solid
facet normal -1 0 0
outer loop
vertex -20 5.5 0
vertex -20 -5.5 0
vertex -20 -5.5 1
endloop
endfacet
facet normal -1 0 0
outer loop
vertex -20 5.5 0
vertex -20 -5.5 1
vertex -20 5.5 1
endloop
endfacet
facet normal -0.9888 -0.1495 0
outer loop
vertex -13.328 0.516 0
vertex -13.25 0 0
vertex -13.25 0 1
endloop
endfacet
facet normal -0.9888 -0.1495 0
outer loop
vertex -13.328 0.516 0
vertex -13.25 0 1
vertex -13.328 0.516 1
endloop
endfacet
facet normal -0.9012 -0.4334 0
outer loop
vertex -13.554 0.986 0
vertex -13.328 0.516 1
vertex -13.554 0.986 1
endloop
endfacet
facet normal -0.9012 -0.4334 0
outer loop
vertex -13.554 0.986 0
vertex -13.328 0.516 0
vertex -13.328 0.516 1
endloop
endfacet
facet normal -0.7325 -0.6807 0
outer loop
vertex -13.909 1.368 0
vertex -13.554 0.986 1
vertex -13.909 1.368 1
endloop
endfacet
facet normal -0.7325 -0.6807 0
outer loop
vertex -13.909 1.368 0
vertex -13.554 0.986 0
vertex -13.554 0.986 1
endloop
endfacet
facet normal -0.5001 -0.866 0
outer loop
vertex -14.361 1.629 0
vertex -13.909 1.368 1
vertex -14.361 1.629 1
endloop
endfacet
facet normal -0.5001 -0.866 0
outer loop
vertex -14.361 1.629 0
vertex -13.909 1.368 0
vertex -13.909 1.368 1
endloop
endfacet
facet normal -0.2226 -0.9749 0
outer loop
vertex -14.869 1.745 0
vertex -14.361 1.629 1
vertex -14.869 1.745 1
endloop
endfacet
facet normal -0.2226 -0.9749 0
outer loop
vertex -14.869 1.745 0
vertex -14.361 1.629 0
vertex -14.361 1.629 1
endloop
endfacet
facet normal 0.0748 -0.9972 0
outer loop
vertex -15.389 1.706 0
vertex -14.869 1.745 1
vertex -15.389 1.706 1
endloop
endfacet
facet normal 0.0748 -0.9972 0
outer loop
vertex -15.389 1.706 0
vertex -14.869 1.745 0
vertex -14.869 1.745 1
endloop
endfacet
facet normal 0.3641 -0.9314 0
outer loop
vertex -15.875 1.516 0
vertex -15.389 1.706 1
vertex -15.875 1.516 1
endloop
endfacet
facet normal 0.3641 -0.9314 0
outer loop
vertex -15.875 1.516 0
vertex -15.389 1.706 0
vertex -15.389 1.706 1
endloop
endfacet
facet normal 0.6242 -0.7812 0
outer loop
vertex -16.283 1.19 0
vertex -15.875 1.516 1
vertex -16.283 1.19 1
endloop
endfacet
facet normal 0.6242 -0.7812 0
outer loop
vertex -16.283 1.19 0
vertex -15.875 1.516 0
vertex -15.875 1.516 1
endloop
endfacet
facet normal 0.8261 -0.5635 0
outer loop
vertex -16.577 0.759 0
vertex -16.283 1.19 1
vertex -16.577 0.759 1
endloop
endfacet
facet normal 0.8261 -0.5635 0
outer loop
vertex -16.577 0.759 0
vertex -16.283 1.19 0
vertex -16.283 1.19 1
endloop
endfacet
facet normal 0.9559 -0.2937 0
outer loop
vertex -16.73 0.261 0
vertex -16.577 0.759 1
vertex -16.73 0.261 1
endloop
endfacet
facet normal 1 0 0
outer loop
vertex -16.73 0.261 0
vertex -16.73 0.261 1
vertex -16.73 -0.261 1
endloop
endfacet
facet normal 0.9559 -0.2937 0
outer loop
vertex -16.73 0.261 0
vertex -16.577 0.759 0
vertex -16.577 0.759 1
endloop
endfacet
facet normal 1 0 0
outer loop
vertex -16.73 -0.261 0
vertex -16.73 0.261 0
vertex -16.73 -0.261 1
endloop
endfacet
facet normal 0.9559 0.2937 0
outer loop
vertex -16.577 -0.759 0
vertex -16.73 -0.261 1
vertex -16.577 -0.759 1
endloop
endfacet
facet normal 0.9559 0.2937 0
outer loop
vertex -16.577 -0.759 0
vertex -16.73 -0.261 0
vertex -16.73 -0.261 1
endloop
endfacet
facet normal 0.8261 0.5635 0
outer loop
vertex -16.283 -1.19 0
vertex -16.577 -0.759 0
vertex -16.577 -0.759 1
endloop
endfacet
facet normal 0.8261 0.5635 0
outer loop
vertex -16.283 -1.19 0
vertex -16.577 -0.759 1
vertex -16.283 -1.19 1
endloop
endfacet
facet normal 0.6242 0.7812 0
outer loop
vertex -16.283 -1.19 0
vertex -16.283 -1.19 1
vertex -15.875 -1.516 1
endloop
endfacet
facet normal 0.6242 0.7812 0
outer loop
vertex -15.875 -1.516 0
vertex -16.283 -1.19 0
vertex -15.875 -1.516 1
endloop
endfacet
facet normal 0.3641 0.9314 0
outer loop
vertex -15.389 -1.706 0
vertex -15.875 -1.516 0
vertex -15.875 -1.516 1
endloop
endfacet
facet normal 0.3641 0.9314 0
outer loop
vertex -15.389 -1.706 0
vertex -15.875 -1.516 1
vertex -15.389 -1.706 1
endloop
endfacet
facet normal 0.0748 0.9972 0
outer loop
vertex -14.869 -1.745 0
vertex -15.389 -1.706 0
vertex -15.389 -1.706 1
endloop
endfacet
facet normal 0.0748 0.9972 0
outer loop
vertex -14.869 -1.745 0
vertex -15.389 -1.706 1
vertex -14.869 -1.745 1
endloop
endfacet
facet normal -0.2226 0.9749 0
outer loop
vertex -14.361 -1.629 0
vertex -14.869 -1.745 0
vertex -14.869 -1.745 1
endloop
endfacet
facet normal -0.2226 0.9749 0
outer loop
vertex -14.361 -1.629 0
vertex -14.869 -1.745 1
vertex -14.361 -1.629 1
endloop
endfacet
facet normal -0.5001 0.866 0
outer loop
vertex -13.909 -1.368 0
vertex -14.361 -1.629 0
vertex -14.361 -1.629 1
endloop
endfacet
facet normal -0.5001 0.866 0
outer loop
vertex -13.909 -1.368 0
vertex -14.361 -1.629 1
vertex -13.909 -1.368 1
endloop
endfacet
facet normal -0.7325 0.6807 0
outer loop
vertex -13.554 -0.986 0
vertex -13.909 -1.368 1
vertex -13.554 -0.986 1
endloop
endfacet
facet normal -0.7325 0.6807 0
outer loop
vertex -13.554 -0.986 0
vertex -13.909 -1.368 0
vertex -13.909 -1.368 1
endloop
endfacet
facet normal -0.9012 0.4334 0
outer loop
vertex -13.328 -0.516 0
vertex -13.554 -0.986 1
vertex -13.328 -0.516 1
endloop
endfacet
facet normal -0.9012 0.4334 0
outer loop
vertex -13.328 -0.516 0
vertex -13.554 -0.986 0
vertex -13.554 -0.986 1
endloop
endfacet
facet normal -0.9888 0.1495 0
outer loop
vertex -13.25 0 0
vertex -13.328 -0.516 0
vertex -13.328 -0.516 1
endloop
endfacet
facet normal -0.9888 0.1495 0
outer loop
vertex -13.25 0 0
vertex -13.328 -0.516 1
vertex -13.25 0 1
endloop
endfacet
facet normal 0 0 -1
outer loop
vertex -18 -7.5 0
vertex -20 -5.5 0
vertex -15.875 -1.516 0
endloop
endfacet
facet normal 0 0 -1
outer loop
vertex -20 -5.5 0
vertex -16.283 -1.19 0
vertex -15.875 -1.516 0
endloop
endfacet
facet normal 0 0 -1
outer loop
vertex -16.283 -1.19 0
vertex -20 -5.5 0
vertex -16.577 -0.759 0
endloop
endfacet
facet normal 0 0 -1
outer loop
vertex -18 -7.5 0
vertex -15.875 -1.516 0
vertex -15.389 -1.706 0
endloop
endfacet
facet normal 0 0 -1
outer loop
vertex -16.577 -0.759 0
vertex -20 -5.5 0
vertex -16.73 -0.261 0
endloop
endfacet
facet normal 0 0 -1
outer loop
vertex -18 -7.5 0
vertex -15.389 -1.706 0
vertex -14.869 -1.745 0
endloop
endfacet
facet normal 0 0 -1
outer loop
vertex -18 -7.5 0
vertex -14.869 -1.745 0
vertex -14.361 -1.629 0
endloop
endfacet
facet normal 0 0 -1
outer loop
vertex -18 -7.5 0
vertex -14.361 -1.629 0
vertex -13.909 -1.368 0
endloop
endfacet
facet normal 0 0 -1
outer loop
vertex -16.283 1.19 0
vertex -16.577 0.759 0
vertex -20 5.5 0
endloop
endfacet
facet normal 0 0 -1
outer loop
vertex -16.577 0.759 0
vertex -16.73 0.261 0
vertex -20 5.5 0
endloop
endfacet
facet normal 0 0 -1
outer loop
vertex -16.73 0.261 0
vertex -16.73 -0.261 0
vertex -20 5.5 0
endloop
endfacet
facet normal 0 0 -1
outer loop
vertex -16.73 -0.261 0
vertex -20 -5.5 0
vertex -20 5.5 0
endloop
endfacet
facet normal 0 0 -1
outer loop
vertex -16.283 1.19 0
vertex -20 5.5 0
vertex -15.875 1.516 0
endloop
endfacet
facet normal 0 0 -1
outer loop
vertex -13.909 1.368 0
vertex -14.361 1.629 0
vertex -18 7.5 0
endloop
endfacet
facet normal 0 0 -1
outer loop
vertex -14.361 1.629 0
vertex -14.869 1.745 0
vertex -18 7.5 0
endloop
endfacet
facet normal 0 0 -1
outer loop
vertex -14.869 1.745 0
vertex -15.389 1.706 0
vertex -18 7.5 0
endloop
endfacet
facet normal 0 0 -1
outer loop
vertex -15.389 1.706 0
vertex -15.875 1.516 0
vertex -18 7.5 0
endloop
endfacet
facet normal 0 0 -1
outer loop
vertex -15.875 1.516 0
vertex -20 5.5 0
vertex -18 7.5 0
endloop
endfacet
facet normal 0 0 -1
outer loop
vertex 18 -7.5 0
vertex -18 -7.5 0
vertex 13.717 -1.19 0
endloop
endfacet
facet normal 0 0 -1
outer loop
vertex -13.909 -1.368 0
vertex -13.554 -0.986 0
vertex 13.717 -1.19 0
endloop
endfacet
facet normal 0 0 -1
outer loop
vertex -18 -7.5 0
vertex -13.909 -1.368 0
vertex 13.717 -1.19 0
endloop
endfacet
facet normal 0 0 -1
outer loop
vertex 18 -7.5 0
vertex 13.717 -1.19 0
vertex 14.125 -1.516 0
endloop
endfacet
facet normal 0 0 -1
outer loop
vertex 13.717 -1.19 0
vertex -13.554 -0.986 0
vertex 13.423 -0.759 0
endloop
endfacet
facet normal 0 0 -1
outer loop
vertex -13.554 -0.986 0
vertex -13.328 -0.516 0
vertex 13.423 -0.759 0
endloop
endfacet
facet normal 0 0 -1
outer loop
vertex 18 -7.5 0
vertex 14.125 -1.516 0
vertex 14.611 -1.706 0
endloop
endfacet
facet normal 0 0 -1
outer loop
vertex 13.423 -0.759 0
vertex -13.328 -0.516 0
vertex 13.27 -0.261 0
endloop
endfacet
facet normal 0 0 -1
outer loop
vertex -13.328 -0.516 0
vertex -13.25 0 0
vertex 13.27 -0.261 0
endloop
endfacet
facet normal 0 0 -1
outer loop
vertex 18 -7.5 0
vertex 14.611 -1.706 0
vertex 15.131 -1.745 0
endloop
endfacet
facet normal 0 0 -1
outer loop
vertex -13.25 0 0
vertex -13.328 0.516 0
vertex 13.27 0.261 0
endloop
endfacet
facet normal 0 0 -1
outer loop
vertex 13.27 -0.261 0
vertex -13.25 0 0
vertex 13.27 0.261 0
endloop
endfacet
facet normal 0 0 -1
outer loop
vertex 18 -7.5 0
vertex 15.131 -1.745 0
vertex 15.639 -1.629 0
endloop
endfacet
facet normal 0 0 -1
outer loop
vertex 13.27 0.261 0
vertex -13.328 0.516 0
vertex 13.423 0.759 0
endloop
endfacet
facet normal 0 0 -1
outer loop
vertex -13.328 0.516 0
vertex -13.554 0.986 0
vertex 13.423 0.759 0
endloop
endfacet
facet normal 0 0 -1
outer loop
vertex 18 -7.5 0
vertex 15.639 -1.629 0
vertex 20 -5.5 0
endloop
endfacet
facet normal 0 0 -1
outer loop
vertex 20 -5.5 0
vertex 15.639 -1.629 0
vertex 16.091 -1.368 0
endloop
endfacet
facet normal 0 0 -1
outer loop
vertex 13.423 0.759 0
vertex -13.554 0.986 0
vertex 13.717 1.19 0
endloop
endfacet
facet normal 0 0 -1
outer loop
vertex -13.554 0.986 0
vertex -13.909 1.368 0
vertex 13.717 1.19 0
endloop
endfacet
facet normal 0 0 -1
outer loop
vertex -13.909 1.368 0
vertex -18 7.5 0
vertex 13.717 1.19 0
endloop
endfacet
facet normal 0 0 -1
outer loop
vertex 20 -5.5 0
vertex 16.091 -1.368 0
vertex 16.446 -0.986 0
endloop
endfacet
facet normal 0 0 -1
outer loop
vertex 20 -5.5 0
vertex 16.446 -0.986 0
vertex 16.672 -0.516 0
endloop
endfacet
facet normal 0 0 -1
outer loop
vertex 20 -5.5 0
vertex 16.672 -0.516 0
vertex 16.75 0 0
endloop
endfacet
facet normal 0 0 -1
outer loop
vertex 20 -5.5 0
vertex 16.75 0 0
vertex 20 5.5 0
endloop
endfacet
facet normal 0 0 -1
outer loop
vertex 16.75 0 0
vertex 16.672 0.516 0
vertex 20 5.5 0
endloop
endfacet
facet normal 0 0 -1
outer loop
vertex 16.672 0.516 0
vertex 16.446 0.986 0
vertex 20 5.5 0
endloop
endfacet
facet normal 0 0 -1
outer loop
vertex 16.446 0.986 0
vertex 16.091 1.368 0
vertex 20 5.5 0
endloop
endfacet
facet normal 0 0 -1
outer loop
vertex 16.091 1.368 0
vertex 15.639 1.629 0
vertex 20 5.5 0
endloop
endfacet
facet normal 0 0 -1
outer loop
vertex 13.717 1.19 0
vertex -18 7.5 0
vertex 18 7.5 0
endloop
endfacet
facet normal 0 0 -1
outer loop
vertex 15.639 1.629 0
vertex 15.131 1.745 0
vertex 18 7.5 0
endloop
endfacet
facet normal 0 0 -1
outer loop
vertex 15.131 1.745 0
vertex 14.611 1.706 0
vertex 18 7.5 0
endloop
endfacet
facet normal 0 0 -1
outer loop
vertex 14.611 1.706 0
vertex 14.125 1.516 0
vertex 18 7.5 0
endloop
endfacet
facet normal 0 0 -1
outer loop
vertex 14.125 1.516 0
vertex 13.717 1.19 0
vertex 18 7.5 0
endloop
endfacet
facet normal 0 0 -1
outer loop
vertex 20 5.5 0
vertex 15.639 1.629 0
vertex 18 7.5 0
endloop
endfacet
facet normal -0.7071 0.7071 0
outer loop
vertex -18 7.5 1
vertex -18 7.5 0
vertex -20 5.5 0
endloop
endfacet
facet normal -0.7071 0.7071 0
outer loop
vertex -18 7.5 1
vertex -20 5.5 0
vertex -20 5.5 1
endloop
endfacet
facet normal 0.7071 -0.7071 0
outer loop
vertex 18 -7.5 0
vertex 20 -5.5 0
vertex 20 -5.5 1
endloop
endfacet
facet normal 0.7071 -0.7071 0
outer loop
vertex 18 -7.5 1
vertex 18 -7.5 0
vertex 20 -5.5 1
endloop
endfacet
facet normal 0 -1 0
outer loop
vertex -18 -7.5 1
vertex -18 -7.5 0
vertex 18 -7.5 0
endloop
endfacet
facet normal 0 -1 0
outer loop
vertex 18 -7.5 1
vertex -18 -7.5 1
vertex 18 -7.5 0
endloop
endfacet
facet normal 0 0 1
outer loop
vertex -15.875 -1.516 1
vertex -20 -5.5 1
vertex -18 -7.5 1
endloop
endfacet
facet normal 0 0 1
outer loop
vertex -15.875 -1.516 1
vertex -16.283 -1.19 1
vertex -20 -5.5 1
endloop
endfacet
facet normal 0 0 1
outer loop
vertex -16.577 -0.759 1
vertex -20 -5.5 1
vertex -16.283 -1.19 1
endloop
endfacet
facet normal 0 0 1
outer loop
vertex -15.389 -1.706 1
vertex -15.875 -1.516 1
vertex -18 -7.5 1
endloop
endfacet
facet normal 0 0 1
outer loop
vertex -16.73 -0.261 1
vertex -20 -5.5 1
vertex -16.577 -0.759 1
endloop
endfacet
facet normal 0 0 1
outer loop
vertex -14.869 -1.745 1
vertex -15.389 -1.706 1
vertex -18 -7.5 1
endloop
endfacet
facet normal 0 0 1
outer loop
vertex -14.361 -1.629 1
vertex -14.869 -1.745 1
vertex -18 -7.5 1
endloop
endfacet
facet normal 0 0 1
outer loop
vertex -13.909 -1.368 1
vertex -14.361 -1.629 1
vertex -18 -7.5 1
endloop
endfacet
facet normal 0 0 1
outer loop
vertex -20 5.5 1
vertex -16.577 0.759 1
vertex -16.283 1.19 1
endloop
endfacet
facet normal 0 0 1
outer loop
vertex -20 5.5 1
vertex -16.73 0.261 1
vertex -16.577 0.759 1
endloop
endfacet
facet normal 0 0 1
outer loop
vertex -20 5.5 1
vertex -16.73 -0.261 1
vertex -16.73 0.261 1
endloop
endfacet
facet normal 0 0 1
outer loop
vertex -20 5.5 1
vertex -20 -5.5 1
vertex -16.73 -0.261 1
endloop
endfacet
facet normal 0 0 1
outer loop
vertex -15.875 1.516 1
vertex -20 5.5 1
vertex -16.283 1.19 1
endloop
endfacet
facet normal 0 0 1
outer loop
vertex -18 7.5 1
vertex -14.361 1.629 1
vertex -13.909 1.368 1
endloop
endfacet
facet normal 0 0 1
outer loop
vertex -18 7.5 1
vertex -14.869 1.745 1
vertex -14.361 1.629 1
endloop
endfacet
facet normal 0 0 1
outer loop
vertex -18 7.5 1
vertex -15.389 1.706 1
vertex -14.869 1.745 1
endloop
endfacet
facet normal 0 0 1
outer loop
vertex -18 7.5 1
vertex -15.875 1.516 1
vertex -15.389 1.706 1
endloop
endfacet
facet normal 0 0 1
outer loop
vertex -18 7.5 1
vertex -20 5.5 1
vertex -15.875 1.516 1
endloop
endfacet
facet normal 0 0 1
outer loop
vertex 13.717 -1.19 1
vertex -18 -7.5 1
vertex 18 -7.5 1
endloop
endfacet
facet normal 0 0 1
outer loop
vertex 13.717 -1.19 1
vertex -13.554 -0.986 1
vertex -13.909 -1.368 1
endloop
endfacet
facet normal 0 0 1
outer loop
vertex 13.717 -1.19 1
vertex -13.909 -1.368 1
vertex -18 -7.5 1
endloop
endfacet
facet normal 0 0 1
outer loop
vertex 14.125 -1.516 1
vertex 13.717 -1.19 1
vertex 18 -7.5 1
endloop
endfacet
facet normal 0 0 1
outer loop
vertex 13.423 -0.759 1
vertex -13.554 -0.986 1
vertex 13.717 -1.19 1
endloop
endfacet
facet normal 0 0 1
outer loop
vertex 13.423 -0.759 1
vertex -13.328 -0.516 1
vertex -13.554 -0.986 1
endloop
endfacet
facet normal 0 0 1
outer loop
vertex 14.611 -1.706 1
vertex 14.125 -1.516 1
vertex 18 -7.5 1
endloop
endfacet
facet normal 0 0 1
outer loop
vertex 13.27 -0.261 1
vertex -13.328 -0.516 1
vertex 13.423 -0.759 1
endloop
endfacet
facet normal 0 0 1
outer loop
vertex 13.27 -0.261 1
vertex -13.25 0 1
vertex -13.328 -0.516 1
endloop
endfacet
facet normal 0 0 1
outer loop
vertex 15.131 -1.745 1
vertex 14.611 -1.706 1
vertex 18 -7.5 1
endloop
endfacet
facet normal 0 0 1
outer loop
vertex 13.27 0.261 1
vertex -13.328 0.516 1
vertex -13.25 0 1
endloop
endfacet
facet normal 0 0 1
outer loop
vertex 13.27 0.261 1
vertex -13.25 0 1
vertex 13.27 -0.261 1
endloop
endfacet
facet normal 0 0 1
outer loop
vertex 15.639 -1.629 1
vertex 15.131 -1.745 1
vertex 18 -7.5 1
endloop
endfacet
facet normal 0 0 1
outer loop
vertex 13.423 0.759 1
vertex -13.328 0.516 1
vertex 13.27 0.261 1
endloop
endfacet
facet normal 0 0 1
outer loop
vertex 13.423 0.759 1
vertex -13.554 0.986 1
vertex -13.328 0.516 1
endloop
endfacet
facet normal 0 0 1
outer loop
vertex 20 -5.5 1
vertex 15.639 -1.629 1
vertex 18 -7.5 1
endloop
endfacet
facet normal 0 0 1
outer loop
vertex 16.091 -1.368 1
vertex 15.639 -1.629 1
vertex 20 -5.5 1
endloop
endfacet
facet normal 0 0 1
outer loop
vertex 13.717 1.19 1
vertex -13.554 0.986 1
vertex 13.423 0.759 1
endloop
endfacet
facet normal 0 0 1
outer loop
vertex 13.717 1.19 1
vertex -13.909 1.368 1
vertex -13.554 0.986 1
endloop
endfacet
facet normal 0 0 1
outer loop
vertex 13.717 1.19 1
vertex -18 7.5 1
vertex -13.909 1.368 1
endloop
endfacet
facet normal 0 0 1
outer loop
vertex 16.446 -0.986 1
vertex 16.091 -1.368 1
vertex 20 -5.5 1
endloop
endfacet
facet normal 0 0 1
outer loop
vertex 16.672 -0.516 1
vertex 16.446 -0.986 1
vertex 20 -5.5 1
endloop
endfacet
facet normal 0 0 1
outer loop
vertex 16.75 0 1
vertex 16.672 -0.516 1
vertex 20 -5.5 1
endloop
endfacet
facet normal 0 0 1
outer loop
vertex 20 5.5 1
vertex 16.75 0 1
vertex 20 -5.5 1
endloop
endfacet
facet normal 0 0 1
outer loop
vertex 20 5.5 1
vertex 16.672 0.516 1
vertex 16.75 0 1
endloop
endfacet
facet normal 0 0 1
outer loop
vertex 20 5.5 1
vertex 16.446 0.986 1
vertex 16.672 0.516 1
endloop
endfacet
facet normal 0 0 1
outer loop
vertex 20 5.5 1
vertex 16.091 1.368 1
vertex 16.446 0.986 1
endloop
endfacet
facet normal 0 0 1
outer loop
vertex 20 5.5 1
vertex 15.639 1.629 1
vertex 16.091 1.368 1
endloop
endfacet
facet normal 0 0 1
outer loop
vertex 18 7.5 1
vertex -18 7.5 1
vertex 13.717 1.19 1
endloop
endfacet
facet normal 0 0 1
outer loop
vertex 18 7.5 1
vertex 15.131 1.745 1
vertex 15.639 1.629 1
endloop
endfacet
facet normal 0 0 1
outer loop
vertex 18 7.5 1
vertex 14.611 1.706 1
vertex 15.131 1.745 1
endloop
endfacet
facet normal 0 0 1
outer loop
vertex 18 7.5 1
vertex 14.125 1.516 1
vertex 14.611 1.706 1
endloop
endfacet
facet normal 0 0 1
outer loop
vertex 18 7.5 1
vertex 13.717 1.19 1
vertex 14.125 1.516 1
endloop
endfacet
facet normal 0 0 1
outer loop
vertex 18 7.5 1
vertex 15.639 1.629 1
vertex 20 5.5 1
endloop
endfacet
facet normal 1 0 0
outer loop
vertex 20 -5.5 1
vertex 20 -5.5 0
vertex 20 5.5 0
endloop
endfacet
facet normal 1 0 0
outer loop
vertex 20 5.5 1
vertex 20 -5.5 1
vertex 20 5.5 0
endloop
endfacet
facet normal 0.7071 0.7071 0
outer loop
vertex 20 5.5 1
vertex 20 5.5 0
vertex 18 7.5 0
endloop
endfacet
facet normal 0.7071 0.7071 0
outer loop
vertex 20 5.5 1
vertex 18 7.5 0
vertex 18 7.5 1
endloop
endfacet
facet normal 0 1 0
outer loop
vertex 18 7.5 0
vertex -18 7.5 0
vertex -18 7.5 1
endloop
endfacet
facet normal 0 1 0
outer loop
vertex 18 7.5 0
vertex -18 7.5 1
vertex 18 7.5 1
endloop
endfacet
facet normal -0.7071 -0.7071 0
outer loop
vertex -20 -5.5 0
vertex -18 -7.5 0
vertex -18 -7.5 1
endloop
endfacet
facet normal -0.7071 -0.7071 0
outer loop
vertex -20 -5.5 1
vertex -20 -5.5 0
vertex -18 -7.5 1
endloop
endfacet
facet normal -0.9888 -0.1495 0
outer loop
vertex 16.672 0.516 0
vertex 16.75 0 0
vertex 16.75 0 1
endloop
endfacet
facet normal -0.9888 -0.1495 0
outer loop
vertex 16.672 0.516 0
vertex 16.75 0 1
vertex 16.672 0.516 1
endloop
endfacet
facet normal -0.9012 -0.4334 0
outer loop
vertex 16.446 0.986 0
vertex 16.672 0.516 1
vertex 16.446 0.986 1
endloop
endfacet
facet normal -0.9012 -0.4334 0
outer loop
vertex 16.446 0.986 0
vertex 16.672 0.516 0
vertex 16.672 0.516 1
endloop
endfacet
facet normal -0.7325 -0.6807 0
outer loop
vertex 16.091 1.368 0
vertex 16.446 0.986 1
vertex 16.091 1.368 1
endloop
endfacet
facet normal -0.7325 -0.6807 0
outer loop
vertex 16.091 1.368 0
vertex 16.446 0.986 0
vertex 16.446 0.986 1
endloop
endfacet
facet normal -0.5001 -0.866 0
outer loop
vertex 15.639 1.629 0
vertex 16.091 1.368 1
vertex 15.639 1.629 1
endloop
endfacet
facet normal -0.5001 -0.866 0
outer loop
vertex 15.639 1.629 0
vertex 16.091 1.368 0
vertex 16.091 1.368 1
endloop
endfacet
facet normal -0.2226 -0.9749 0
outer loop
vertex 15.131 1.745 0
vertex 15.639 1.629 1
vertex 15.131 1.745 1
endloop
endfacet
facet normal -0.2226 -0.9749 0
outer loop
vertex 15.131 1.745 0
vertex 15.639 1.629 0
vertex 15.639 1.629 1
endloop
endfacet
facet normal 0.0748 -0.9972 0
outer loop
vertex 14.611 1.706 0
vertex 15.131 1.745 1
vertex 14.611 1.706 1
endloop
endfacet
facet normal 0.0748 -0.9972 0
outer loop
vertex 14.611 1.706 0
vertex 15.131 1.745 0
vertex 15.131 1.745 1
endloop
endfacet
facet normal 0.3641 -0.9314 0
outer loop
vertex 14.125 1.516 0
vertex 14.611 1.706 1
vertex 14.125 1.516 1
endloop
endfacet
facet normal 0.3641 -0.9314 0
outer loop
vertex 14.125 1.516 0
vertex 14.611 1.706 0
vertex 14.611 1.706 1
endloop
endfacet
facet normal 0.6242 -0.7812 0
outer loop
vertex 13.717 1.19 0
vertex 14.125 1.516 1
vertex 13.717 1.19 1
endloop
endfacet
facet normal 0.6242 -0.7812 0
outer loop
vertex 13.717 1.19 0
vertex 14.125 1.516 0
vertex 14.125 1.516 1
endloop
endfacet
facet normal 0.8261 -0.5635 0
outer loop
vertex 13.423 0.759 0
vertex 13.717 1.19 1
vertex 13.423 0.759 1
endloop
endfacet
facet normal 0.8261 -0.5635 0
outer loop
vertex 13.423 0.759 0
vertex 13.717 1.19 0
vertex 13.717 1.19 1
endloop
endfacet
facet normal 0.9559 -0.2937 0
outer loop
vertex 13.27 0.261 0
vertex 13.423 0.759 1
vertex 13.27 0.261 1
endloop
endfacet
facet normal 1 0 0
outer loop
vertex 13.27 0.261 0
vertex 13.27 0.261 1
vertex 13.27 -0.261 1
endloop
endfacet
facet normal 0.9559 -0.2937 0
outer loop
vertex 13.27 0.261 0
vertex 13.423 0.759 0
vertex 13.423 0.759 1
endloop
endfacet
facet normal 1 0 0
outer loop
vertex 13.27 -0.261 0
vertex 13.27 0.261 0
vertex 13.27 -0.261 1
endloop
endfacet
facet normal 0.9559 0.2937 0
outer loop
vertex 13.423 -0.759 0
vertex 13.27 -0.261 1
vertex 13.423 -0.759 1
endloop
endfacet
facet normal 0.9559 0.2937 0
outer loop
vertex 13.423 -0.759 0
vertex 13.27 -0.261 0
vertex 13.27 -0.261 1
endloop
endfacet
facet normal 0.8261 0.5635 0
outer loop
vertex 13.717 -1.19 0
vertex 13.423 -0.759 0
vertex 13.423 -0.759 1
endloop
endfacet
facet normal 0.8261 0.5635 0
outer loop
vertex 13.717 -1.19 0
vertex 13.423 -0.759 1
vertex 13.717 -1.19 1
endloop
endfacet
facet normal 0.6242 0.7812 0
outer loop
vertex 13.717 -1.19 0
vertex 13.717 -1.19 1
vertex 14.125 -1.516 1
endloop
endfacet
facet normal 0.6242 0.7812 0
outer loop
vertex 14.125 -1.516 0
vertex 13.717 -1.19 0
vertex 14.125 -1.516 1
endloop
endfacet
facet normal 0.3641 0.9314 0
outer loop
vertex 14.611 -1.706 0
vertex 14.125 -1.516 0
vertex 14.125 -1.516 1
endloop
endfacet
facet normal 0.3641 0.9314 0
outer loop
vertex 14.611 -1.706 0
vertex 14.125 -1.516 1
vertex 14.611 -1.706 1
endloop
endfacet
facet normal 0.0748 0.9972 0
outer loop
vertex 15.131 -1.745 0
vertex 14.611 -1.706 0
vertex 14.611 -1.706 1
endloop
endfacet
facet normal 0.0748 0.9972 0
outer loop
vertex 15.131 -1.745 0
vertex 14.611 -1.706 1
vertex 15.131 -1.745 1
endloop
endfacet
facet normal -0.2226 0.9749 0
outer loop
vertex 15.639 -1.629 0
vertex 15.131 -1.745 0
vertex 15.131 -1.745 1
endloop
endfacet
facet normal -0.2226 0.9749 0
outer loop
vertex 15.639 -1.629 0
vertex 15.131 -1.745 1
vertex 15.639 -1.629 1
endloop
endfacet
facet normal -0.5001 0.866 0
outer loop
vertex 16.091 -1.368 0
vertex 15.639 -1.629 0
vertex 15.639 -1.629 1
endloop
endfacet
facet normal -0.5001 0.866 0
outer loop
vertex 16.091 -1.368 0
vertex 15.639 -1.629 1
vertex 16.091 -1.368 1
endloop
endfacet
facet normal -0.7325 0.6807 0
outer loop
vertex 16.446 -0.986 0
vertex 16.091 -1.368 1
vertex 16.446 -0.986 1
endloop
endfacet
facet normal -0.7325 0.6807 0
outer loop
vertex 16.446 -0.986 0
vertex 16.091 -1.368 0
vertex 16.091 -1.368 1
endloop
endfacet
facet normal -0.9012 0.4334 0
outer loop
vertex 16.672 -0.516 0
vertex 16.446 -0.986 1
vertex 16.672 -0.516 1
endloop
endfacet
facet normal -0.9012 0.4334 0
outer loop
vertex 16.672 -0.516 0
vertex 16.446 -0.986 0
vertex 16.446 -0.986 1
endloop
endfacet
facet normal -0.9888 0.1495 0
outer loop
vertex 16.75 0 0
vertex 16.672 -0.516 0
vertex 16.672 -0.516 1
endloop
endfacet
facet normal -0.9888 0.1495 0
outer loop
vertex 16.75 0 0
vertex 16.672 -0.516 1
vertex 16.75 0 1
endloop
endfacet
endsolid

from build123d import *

# Parameters (mm, degrees)
SKIZZE1_W                       = 40
SKIZZE1_H                       = 15
SKIZZE1_R                       = 1.75
AUFSATZ_LINEAR_AUSTRAGEN1_DEPTH = 1
FASE1_SIZE                      = 2


with BuildPart() as part:
    # Skizze1 → Aufsatz-Linear austragen1 (new body)
    with BuildSketch(Plane.XY):
        Rectangle(SKIZZE1_W, SKIZZE1_H)
        with Locations((-15, 0)):
            Circle(SKIZZE1_R, mode=Mode.SUBTRACT)
        with Locations((15, 0)):
            Circle(SKIZZE1_R, mode=Mode.SUBTRACT)
    extrude(amount=AUFSATZ_LINEAR_AUSTRAGEN1_DEPTH)

    # Fase1
    fase1_edges = [part.edges().sort_by_distance(p)[0] for p in [
        (-20, 7.5, 0.5),
        (20, 7.5, 0.5),
        (20, -7.5, 0.5),
        (-20, -7.5, 0.5),
    ]]
    chamfer(fase1_edges, length=FASE1_SIZE)


solid = part.part
